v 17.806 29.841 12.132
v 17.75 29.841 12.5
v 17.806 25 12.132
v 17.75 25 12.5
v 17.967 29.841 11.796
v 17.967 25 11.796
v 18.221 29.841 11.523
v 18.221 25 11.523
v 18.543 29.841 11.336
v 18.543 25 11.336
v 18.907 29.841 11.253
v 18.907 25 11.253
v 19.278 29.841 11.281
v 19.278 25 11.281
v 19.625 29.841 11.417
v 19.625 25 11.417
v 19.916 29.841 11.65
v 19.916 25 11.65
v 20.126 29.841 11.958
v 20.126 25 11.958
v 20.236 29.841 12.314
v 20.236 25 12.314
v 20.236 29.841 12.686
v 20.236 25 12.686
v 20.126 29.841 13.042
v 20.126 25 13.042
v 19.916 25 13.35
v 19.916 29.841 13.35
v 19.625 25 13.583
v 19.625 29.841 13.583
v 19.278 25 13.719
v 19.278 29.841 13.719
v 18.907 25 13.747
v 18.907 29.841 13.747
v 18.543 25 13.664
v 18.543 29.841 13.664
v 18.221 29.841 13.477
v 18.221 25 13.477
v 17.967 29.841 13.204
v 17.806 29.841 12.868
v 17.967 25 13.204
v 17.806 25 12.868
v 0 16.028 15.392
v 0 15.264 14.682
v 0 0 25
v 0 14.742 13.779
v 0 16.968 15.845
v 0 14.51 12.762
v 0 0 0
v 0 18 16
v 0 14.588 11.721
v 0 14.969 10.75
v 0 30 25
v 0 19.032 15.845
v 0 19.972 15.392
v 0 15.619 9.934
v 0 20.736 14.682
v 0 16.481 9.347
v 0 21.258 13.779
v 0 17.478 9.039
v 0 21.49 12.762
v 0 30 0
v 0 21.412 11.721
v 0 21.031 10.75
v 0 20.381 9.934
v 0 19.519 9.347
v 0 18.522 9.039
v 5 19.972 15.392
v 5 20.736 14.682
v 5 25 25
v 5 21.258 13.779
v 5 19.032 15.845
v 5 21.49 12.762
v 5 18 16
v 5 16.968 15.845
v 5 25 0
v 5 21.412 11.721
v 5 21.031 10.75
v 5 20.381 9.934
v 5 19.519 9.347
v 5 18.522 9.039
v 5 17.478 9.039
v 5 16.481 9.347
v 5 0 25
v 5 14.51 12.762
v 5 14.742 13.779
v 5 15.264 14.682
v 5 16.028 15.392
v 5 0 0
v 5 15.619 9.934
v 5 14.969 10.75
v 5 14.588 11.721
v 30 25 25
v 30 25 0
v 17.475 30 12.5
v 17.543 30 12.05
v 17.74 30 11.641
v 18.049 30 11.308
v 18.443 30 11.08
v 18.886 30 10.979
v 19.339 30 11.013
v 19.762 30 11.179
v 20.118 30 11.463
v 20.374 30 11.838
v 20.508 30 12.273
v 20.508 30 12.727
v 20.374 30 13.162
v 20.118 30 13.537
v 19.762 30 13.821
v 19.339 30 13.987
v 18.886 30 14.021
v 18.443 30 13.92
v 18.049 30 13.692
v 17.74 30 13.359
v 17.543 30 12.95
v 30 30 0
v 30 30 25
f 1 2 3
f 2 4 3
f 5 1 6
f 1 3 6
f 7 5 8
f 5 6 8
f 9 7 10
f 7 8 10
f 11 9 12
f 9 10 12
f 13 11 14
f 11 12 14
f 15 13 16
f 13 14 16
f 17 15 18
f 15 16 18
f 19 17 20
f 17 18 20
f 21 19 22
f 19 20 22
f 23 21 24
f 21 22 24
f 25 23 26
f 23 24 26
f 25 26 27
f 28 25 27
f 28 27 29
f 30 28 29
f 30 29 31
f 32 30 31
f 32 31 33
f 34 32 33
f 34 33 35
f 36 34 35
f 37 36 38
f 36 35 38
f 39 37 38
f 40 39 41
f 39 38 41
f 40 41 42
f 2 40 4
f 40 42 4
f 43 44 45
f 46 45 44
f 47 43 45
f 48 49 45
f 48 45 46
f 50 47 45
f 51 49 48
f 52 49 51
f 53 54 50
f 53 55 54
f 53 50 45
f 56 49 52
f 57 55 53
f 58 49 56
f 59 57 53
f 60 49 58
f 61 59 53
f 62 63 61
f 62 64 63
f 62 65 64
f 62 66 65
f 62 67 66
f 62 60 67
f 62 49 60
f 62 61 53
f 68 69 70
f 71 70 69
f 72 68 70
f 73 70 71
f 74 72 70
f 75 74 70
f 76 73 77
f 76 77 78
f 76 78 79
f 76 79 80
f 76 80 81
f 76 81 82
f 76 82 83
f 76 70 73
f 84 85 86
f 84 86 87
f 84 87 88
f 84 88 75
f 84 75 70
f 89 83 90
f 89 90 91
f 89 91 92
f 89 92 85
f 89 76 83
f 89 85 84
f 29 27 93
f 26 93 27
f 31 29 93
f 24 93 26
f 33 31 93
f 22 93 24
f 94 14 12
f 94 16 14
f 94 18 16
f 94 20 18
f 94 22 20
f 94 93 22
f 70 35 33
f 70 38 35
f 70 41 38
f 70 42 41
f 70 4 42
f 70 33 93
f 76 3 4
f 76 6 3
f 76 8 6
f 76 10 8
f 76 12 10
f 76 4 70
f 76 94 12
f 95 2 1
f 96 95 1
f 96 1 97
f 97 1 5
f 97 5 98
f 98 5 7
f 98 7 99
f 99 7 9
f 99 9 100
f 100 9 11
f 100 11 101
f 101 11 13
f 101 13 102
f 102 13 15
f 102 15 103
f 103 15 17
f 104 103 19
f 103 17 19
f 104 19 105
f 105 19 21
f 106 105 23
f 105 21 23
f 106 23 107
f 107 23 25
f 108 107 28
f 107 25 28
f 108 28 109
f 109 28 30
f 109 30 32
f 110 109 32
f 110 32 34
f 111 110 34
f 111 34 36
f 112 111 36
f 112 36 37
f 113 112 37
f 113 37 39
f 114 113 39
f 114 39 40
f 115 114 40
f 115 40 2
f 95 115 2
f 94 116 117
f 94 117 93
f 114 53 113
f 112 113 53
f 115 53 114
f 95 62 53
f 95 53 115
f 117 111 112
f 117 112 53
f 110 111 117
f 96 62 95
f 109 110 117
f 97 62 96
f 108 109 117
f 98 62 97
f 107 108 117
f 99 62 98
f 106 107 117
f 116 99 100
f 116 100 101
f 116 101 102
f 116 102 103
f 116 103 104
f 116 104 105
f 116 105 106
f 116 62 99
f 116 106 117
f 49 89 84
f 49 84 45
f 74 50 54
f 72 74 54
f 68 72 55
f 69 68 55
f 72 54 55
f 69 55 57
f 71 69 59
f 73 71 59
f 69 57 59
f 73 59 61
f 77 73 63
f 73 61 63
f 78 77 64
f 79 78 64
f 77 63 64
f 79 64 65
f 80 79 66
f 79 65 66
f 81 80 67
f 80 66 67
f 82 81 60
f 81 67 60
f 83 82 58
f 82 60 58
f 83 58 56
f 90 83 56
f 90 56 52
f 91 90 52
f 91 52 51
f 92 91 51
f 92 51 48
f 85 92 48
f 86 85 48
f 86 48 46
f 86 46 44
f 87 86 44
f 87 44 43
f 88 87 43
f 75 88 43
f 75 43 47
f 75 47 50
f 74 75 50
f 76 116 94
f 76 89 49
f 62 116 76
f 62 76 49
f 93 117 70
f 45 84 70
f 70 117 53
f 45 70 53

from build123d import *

# Parameters (mm, degrees)
ESTRUSIONE_ESTRUSIONE1_DEPTH    = 25
SCHIZZO2_R                      = 3.5
TAGLIO_ESTRUSIONE1_DEPTH        = 25
FORO_FILETTATO_M3_1_D           = 2.5
FORO_FILETTATO_M3_1_DEPTH       = 8.5
FORO_FILETTATO_M3_1_CSINK_D     = 3.05
FORO_FILETTATO_M3_1_CSINK_ANGLE = 120
FORO_FILETTATO_M3_1_TIP         = 0.751075774


with BuildPart() as part:
    # Schizzo1 → Estrusione-Estrusione1 (new body)
    with BuildSketch(Plane.XY):
        Polygon((0, 0), (0, 30), (30, 30), (30, 25), (5, 25), (5, 0), align=None)
    extrude(amount=ESTRUSIONE_ESTRUSIONE1_DEPTH)

    # Schizzo2 → Taglio-Estrusione1 (cut)
    with BuildSketch(Plane.ZY):
        with Locations((12.5, 18)):
            Circle(SCHIZZO2_R)
    extrude(amount=-TAGLIO_ESTRUSIONE1_DEPTH, mode=Mode.SUBTRACT)

    # Foro filettato M3-1
    with Locations(Plane(origin=(0, 30, 0), x_dir=(1, 0, 0), z_dir=(0, 1, 0))):
        with Locations((19, -12.5)):
            CounterSinkHole(FORO_FILETTATO_M3_1_D / 2, FORO_FILETTATO_M3_1_CSINK_D / 2, depth=FORO_FILETTATO_M3_1_DEPTH, counter_sink_angle=FORO_FILETTATO_M3_1_CSINK_ANGLE)
            with Locations((0, 0, -(FORO_FILETTATO_M3_1_DEPTH + FORO_FILETTATO_M3_1_TIP / 2))):  # 118° drill point
                Cone(0, FORO_FILETTATO_M3_1_D / 2, FORO_FILETTATO_M3_1_TIP, mode=Mode.SUBTRACT)


solid = part.part
